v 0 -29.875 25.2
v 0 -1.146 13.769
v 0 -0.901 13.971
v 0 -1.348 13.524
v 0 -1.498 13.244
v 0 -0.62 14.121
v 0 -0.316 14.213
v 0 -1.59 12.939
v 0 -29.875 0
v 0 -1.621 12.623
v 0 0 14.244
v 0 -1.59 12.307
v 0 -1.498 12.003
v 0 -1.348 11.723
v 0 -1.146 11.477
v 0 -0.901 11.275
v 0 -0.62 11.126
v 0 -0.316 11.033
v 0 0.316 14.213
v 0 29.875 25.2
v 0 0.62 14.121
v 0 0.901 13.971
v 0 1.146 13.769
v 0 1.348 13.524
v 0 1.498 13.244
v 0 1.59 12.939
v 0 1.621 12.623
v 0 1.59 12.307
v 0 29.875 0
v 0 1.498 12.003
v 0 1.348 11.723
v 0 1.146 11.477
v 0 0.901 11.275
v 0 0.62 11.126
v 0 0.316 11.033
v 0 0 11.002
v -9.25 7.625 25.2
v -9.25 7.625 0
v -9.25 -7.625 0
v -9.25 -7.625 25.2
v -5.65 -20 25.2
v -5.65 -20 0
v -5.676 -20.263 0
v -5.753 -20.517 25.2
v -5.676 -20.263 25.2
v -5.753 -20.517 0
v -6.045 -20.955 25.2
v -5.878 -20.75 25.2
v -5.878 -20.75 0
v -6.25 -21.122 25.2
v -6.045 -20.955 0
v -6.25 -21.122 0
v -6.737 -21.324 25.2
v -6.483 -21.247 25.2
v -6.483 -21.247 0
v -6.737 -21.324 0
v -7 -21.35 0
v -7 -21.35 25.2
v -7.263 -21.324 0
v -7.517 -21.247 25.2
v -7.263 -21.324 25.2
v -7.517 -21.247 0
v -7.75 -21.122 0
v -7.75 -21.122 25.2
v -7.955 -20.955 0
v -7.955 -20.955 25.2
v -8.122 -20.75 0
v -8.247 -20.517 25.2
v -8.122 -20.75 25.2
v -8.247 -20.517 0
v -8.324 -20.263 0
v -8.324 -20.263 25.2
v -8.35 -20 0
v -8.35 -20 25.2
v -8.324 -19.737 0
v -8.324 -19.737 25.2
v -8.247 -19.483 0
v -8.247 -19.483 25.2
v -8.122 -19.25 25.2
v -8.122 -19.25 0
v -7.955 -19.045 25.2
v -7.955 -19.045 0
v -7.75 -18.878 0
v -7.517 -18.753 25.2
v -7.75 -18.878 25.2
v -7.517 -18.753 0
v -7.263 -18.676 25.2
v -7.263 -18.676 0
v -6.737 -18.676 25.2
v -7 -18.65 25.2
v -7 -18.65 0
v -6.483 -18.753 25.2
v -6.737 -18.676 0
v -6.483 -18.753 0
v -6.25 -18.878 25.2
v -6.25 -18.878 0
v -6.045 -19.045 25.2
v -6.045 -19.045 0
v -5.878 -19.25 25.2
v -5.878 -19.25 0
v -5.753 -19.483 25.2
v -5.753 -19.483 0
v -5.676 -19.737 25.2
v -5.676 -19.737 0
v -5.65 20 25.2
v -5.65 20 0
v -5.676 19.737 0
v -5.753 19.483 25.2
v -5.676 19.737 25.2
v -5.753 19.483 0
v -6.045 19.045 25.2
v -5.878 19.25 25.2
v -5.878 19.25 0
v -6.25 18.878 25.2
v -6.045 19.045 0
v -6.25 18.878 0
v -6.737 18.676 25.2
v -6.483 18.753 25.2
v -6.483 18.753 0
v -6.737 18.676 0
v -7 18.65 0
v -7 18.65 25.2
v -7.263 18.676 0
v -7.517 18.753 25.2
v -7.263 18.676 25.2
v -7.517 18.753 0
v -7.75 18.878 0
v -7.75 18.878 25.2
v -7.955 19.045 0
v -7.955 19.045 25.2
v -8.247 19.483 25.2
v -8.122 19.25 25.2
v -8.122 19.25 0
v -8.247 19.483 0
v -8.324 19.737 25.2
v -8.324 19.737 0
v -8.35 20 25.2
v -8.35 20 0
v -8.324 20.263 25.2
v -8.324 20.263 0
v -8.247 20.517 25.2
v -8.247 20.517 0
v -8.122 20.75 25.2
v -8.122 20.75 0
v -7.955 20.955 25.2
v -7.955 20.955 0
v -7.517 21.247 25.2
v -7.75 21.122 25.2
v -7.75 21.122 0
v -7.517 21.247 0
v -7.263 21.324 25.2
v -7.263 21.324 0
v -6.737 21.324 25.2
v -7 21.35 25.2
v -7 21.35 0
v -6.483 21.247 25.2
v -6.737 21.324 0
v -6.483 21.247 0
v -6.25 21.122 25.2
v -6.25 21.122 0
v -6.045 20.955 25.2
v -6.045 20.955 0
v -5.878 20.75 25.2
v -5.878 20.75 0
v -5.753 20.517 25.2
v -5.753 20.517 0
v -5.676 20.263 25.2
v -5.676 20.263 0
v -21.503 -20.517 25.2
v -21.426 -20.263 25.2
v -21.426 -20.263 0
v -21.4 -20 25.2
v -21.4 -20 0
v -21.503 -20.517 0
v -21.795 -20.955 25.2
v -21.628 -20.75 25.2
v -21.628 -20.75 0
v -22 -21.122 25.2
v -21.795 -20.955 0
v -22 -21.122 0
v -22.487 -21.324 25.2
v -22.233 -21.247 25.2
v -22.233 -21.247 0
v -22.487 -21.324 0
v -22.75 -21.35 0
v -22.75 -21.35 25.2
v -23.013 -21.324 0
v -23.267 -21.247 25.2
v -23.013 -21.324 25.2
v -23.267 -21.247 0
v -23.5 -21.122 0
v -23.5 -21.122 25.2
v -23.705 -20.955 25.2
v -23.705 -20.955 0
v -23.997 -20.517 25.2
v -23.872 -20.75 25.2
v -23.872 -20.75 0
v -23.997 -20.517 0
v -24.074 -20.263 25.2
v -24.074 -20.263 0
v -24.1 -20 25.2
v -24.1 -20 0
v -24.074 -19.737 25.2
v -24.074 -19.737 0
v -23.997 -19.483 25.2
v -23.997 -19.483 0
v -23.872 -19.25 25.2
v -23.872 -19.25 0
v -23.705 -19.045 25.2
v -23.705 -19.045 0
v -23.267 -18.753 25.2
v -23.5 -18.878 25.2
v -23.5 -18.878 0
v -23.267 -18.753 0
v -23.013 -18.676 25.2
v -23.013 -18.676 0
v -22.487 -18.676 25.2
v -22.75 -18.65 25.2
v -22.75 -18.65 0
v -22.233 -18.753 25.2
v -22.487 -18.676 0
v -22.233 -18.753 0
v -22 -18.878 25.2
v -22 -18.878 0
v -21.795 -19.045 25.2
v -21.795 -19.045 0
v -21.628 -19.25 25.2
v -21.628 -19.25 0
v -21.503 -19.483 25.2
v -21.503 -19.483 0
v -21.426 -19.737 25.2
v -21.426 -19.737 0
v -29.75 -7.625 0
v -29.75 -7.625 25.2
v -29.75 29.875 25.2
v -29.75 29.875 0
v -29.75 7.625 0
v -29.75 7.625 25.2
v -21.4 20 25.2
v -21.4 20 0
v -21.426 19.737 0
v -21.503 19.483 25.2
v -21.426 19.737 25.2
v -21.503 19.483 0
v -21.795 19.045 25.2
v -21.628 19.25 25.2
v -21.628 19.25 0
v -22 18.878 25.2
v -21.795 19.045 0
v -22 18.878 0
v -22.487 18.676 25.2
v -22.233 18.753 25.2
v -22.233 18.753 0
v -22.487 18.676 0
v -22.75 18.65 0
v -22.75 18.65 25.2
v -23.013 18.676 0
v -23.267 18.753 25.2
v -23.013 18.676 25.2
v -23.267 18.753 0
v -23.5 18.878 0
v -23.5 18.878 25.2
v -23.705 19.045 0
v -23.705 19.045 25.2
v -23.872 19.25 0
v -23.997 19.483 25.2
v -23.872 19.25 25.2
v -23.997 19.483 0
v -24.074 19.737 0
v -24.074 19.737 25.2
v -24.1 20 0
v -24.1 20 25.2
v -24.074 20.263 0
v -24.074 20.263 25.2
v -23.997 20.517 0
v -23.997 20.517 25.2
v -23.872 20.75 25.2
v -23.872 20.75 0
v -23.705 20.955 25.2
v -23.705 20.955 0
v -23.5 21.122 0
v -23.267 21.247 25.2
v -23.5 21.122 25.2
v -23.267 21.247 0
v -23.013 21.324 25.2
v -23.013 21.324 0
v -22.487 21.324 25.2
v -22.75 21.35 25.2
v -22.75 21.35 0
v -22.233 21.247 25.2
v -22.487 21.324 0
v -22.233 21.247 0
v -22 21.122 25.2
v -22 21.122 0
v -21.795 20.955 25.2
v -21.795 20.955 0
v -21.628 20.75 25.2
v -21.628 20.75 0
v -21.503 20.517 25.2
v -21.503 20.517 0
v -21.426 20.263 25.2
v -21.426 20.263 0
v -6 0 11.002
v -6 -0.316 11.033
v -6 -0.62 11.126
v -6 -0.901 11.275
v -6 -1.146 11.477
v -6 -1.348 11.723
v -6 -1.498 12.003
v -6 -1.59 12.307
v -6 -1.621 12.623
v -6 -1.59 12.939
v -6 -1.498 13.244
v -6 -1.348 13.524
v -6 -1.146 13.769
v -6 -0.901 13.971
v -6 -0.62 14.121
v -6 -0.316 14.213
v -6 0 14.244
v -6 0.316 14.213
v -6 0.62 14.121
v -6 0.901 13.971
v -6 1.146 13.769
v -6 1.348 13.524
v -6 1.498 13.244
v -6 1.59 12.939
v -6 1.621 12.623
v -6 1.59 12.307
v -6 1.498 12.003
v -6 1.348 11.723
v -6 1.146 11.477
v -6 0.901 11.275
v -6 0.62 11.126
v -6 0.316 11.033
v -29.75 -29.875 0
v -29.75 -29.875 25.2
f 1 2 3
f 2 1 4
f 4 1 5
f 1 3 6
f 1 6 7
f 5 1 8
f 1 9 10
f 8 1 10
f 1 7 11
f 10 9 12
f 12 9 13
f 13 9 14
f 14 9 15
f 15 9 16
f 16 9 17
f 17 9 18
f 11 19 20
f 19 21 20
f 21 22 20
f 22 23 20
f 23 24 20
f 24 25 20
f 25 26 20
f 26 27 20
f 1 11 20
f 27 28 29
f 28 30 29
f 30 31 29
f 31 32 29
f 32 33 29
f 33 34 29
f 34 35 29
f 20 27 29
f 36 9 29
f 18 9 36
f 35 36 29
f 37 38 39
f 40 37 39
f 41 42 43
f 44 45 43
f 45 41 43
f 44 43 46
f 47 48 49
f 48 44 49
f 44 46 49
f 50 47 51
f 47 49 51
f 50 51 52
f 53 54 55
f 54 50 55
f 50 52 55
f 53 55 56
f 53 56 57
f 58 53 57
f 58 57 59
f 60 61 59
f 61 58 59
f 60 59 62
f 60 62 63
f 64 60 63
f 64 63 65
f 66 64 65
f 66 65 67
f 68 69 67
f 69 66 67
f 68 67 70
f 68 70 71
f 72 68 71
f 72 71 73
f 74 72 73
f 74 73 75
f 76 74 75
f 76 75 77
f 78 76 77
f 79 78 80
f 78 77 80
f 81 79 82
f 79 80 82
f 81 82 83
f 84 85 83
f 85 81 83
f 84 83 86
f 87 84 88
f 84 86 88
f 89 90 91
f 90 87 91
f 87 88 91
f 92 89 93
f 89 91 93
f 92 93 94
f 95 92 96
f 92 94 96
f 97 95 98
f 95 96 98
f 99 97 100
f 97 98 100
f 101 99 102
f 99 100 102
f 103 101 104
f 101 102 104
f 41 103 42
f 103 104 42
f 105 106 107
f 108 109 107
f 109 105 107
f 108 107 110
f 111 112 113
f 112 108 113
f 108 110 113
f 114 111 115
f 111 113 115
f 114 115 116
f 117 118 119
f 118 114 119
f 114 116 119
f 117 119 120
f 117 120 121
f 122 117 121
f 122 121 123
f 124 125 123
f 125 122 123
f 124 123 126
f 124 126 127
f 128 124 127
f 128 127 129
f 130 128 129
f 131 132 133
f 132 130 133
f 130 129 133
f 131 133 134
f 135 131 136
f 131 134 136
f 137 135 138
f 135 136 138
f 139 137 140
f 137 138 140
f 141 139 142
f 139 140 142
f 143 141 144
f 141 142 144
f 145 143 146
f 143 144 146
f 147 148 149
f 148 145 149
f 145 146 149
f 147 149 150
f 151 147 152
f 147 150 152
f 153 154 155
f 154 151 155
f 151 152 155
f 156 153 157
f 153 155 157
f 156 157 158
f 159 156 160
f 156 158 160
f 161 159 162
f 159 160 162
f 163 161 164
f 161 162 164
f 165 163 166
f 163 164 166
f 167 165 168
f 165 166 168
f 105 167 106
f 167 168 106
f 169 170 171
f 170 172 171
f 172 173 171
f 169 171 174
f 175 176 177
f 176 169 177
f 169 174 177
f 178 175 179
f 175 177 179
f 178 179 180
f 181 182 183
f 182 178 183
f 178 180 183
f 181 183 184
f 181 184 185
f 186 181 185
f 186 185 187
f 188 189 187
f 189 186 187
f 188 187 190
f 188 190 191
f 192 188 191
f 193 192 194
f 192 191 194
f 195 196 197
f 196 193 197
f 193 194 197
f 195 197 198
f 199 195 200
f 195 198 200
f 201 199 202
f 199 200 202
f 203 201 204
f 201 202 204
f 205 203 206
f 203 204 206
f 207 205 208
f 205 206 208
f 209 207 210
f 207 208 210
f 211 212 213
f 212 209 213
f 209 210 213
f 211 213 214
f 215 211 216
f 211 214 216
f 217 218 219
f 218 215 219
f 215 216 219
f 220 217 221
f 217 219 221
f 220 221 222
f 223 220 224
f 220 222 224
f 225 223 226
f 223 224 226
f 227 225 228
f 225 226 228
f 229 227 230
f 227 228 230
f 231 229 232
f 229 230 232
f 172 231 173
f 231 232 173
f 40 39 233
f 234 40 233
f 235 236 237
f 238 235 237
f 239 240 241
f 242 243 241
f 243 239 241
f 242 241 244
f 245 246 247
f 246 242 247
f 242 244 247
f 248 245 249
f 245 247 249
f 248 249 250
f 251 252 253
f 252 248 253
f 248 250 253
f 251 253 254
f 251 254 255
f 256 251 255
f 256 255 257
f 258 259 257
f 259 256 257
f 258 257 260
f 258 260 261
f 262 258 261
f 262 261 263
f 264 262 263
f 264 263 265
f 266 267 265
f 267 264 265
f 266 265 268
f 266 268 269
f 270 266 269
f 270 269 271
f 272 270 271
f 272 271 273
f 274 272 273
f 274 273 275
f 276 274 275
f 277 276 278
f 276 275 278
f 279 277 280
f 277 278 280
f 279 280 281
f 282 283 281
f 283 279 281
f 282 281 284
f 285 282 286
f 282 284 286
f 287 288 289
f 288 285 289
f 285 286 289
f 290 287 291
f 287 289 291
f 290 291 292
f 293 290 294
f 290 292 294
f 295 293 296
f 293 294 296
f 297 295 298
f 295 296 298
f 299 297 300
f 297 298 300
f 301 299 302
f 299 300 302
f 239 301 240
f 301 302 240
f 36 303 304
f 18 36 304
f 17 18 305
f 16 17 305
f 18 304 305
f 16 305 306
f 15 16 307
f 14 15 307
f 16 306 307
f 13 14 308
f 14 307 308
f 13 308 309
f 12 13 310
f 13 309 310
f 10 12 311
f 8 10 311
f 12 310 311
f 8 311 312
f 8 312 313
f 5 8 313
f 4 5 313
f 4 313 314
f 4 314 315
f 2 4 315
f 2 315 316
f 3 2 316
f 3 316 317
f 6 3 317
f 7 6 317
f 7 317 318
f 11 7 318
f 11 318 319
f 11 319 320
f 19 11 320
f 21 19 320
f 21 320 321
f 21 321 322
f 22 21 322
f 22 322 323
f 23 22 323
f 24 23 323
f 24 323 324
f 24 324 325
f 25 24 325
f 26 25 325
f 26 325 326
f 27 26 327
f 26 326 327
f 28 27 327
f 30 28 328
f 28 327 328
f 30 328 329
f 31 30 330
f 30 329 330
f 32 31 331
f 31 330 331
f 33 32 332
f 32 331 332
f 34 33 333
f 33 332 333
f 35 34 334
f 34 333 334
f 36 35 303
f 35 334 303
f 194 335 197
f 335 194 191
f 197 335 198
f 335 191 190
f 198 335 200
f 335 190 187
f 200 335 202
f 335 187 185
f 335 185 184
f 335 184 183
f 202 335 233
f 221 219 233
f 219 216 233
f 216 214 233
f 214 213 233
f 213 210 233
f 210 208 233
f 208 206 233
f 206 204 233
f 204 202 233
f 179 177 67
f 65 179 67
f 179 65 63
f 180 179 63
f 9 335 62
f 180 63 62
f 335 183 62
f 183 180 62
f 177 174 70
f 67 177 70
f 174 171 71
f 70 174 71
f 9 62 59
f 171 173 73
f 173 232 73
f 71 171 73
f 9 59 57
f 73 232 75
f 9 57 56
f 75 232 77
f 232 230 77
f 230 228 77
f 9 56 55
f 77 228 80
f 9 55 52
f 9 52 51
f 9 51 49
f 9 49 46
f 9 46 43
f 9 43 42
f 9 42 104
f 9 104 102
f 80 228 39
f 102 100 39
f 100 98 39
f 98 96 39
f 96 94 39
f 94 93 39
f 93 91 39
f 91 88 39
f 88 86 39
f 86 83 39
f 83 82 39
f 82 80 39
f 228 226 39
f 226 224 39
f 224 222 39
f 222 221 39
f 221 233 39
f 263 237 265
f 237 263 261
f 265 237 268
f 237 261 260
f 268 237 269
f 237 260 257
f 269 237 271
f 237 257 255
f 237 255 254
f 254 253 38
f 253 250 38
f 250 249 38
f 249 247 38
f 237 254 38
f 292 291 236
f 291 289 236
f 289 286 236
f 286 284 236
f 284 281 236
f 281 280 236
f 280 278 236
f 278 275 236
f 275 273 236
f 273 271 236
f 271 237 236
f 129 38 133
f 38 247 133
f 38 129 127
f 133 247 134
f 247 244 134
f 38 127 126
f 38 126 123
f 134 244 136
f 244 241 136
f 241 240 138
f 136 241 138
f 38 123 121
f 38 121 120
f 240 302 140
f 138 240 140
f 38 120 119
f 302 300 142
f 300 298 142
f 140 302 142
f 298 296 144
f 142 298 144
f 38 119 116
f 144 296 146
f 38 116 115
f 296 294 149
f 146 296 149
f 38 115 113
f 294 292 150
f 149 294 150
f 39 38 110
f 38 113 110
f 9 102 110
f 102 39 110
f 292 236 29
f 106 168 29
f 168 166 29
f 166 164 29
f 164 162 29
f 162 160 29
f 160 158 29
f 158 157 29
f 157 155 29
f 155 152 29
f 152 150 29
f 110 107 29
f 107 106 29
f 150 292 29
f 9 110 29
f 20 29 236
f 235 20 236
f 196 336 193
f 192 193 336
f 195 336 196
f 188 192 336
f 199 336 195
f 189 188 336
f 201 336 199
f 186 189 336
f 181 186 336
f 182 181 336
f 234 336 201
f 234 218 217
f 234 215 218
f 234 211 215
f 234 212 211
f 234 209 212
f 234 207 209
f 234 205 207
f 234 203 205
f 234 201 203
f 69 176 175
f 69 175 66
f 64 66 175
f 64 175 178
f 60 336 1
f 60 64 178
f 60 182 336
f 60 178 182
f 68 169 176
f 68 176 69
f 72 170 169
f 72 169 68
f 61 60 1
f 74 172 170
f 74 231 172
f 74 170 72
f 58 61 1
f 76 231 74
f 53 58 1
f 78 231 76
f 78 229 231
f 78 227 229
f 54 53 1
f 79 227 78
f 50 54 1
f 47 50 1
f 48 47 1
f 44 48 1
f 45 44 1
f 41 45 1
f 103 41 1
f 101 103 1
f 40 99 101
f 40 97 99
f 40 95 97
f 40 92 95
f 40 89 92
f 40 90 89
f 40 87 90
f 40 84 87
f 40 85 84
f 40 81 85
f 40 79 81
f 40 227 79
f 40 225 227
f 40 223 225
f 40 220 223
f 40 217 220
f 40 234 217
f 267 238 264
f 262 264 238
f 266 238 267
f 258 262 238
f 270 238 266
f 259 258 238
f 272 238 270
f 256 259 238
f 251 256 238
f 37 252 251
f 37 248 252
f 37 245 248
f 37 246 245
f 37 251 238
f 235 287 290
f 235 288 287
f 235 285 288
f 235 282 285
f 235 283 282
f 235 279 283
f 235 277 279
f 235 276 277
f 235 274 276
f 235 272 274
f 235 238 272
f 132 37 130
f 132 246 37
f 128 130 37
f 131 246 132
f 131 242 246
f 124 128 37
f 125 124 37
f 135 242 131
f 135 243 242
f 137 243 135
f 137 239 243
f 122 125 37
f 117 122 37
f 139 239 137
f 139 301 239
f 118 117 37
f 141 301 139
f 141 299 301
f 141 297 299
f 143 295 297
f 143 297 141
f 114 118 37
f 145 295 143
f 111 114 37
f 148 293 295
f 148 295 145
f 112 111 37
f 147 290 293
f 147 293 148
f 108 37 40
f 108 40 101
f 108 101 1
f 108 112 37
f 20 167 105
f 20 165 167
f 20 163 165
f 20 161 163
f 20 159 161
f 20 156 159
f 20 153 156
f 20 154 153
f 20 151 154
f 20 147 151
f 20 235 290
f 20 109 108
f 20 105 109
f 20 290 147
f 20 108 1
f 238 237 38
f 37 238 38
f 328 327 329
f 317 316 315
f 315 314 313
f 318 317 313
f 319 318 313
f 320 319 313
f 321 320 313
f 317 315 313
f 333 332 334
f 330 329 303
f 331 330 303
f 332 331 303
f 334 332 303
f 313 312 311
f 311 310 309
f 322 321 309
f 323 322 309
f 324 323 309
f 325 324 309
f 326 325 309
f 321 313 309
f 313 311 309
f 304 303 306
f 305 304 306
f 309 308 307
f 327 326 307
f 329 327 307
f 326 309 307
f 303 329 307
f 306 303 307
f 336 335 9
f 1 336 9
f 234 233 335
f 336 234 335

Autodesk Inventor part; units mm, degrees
ref_plane "YZ Plane" through (0, 0, 0) normal (1, 0, 0) x (0, 1, 0)
ref_plane "XZ Plane" through (0, 0, 0) normal (0, 1, 0) x (-1, 0, 0)
ref_plane "XY Plane" through (0, 0, 0) normal (0, 0, 1) x (1, 0, 0)
ref_plane "Work Plane1" through (0, 0, 0) normal (0, 0, 1) x (1, 0, 0)
sketch "Sketch1" plane through (0, 0, 0) normal (0, 0, 1) x (1, 0, 0)
  line L0 (-9.25, 7.625) -> (-9.25, -7.625) projected
  line L1 (-9.25, -7.625) -> (-29.75, -7.625) projected
  line L2 (-29.75, -7.625) -> (-29.75, -29.875) projected
  line L3 (-29.75, -29.875) -> (0, -29.875) projected
  line L4 (0, -29.875) -> (0, 29.875) projected
  line L5 (0, 29.875) -> (-29.75, 29.875) projected
  line L6 (-29.75, 29.875) -> (-29.75, 7.625) projected
  line L7 (-29.75, 7.625) -> (-9.25, 7.625) projected
  circle A0 centre (-15, 14.875) radius 3.5 projected
  circle A1 centre (-15, -14.875) radius 3.5 projected
  circle A2 centre (-7, 20) radius 1.35 projected
  circle A3 centre (-6, 0) radius 1.35 projected
  circle A4 centre (-7, -20) radius 1.35 projected
  circle A5 centre (-22.75, -20) radius 1.35 projected
  circle A6 centre (-22.75, 20) radius 1.35 projected
  line L8 (-29.75, -29.875) -> (0, -29.875)
  line L9 (0, 29.875) -> (-29.75, 29.875)
  point P0 (0, 0)
extrude "Extrusion1" add sketch "Sketch1" along normal blind 25.2 contours L7 L6 L5 L4 L3 L2 L1 L0 | A0 | A1 | A3
sketch "Sketch3" plane through (0, -29.875, 0) normal (1, 0, 0) x (0, 0, -1)
  circle A0 centre (-12.6232, 29.875) radius 1.621 projected
  point P0 (0, 29.875)
hole "Hole2" at (0, 0, 12.6232) direction (-1, 0, 0) diameter 3.242 depth 6 thread size "M4x0.7" class "6H" standard "ISO Metric profile"
properties part number "holder1"
